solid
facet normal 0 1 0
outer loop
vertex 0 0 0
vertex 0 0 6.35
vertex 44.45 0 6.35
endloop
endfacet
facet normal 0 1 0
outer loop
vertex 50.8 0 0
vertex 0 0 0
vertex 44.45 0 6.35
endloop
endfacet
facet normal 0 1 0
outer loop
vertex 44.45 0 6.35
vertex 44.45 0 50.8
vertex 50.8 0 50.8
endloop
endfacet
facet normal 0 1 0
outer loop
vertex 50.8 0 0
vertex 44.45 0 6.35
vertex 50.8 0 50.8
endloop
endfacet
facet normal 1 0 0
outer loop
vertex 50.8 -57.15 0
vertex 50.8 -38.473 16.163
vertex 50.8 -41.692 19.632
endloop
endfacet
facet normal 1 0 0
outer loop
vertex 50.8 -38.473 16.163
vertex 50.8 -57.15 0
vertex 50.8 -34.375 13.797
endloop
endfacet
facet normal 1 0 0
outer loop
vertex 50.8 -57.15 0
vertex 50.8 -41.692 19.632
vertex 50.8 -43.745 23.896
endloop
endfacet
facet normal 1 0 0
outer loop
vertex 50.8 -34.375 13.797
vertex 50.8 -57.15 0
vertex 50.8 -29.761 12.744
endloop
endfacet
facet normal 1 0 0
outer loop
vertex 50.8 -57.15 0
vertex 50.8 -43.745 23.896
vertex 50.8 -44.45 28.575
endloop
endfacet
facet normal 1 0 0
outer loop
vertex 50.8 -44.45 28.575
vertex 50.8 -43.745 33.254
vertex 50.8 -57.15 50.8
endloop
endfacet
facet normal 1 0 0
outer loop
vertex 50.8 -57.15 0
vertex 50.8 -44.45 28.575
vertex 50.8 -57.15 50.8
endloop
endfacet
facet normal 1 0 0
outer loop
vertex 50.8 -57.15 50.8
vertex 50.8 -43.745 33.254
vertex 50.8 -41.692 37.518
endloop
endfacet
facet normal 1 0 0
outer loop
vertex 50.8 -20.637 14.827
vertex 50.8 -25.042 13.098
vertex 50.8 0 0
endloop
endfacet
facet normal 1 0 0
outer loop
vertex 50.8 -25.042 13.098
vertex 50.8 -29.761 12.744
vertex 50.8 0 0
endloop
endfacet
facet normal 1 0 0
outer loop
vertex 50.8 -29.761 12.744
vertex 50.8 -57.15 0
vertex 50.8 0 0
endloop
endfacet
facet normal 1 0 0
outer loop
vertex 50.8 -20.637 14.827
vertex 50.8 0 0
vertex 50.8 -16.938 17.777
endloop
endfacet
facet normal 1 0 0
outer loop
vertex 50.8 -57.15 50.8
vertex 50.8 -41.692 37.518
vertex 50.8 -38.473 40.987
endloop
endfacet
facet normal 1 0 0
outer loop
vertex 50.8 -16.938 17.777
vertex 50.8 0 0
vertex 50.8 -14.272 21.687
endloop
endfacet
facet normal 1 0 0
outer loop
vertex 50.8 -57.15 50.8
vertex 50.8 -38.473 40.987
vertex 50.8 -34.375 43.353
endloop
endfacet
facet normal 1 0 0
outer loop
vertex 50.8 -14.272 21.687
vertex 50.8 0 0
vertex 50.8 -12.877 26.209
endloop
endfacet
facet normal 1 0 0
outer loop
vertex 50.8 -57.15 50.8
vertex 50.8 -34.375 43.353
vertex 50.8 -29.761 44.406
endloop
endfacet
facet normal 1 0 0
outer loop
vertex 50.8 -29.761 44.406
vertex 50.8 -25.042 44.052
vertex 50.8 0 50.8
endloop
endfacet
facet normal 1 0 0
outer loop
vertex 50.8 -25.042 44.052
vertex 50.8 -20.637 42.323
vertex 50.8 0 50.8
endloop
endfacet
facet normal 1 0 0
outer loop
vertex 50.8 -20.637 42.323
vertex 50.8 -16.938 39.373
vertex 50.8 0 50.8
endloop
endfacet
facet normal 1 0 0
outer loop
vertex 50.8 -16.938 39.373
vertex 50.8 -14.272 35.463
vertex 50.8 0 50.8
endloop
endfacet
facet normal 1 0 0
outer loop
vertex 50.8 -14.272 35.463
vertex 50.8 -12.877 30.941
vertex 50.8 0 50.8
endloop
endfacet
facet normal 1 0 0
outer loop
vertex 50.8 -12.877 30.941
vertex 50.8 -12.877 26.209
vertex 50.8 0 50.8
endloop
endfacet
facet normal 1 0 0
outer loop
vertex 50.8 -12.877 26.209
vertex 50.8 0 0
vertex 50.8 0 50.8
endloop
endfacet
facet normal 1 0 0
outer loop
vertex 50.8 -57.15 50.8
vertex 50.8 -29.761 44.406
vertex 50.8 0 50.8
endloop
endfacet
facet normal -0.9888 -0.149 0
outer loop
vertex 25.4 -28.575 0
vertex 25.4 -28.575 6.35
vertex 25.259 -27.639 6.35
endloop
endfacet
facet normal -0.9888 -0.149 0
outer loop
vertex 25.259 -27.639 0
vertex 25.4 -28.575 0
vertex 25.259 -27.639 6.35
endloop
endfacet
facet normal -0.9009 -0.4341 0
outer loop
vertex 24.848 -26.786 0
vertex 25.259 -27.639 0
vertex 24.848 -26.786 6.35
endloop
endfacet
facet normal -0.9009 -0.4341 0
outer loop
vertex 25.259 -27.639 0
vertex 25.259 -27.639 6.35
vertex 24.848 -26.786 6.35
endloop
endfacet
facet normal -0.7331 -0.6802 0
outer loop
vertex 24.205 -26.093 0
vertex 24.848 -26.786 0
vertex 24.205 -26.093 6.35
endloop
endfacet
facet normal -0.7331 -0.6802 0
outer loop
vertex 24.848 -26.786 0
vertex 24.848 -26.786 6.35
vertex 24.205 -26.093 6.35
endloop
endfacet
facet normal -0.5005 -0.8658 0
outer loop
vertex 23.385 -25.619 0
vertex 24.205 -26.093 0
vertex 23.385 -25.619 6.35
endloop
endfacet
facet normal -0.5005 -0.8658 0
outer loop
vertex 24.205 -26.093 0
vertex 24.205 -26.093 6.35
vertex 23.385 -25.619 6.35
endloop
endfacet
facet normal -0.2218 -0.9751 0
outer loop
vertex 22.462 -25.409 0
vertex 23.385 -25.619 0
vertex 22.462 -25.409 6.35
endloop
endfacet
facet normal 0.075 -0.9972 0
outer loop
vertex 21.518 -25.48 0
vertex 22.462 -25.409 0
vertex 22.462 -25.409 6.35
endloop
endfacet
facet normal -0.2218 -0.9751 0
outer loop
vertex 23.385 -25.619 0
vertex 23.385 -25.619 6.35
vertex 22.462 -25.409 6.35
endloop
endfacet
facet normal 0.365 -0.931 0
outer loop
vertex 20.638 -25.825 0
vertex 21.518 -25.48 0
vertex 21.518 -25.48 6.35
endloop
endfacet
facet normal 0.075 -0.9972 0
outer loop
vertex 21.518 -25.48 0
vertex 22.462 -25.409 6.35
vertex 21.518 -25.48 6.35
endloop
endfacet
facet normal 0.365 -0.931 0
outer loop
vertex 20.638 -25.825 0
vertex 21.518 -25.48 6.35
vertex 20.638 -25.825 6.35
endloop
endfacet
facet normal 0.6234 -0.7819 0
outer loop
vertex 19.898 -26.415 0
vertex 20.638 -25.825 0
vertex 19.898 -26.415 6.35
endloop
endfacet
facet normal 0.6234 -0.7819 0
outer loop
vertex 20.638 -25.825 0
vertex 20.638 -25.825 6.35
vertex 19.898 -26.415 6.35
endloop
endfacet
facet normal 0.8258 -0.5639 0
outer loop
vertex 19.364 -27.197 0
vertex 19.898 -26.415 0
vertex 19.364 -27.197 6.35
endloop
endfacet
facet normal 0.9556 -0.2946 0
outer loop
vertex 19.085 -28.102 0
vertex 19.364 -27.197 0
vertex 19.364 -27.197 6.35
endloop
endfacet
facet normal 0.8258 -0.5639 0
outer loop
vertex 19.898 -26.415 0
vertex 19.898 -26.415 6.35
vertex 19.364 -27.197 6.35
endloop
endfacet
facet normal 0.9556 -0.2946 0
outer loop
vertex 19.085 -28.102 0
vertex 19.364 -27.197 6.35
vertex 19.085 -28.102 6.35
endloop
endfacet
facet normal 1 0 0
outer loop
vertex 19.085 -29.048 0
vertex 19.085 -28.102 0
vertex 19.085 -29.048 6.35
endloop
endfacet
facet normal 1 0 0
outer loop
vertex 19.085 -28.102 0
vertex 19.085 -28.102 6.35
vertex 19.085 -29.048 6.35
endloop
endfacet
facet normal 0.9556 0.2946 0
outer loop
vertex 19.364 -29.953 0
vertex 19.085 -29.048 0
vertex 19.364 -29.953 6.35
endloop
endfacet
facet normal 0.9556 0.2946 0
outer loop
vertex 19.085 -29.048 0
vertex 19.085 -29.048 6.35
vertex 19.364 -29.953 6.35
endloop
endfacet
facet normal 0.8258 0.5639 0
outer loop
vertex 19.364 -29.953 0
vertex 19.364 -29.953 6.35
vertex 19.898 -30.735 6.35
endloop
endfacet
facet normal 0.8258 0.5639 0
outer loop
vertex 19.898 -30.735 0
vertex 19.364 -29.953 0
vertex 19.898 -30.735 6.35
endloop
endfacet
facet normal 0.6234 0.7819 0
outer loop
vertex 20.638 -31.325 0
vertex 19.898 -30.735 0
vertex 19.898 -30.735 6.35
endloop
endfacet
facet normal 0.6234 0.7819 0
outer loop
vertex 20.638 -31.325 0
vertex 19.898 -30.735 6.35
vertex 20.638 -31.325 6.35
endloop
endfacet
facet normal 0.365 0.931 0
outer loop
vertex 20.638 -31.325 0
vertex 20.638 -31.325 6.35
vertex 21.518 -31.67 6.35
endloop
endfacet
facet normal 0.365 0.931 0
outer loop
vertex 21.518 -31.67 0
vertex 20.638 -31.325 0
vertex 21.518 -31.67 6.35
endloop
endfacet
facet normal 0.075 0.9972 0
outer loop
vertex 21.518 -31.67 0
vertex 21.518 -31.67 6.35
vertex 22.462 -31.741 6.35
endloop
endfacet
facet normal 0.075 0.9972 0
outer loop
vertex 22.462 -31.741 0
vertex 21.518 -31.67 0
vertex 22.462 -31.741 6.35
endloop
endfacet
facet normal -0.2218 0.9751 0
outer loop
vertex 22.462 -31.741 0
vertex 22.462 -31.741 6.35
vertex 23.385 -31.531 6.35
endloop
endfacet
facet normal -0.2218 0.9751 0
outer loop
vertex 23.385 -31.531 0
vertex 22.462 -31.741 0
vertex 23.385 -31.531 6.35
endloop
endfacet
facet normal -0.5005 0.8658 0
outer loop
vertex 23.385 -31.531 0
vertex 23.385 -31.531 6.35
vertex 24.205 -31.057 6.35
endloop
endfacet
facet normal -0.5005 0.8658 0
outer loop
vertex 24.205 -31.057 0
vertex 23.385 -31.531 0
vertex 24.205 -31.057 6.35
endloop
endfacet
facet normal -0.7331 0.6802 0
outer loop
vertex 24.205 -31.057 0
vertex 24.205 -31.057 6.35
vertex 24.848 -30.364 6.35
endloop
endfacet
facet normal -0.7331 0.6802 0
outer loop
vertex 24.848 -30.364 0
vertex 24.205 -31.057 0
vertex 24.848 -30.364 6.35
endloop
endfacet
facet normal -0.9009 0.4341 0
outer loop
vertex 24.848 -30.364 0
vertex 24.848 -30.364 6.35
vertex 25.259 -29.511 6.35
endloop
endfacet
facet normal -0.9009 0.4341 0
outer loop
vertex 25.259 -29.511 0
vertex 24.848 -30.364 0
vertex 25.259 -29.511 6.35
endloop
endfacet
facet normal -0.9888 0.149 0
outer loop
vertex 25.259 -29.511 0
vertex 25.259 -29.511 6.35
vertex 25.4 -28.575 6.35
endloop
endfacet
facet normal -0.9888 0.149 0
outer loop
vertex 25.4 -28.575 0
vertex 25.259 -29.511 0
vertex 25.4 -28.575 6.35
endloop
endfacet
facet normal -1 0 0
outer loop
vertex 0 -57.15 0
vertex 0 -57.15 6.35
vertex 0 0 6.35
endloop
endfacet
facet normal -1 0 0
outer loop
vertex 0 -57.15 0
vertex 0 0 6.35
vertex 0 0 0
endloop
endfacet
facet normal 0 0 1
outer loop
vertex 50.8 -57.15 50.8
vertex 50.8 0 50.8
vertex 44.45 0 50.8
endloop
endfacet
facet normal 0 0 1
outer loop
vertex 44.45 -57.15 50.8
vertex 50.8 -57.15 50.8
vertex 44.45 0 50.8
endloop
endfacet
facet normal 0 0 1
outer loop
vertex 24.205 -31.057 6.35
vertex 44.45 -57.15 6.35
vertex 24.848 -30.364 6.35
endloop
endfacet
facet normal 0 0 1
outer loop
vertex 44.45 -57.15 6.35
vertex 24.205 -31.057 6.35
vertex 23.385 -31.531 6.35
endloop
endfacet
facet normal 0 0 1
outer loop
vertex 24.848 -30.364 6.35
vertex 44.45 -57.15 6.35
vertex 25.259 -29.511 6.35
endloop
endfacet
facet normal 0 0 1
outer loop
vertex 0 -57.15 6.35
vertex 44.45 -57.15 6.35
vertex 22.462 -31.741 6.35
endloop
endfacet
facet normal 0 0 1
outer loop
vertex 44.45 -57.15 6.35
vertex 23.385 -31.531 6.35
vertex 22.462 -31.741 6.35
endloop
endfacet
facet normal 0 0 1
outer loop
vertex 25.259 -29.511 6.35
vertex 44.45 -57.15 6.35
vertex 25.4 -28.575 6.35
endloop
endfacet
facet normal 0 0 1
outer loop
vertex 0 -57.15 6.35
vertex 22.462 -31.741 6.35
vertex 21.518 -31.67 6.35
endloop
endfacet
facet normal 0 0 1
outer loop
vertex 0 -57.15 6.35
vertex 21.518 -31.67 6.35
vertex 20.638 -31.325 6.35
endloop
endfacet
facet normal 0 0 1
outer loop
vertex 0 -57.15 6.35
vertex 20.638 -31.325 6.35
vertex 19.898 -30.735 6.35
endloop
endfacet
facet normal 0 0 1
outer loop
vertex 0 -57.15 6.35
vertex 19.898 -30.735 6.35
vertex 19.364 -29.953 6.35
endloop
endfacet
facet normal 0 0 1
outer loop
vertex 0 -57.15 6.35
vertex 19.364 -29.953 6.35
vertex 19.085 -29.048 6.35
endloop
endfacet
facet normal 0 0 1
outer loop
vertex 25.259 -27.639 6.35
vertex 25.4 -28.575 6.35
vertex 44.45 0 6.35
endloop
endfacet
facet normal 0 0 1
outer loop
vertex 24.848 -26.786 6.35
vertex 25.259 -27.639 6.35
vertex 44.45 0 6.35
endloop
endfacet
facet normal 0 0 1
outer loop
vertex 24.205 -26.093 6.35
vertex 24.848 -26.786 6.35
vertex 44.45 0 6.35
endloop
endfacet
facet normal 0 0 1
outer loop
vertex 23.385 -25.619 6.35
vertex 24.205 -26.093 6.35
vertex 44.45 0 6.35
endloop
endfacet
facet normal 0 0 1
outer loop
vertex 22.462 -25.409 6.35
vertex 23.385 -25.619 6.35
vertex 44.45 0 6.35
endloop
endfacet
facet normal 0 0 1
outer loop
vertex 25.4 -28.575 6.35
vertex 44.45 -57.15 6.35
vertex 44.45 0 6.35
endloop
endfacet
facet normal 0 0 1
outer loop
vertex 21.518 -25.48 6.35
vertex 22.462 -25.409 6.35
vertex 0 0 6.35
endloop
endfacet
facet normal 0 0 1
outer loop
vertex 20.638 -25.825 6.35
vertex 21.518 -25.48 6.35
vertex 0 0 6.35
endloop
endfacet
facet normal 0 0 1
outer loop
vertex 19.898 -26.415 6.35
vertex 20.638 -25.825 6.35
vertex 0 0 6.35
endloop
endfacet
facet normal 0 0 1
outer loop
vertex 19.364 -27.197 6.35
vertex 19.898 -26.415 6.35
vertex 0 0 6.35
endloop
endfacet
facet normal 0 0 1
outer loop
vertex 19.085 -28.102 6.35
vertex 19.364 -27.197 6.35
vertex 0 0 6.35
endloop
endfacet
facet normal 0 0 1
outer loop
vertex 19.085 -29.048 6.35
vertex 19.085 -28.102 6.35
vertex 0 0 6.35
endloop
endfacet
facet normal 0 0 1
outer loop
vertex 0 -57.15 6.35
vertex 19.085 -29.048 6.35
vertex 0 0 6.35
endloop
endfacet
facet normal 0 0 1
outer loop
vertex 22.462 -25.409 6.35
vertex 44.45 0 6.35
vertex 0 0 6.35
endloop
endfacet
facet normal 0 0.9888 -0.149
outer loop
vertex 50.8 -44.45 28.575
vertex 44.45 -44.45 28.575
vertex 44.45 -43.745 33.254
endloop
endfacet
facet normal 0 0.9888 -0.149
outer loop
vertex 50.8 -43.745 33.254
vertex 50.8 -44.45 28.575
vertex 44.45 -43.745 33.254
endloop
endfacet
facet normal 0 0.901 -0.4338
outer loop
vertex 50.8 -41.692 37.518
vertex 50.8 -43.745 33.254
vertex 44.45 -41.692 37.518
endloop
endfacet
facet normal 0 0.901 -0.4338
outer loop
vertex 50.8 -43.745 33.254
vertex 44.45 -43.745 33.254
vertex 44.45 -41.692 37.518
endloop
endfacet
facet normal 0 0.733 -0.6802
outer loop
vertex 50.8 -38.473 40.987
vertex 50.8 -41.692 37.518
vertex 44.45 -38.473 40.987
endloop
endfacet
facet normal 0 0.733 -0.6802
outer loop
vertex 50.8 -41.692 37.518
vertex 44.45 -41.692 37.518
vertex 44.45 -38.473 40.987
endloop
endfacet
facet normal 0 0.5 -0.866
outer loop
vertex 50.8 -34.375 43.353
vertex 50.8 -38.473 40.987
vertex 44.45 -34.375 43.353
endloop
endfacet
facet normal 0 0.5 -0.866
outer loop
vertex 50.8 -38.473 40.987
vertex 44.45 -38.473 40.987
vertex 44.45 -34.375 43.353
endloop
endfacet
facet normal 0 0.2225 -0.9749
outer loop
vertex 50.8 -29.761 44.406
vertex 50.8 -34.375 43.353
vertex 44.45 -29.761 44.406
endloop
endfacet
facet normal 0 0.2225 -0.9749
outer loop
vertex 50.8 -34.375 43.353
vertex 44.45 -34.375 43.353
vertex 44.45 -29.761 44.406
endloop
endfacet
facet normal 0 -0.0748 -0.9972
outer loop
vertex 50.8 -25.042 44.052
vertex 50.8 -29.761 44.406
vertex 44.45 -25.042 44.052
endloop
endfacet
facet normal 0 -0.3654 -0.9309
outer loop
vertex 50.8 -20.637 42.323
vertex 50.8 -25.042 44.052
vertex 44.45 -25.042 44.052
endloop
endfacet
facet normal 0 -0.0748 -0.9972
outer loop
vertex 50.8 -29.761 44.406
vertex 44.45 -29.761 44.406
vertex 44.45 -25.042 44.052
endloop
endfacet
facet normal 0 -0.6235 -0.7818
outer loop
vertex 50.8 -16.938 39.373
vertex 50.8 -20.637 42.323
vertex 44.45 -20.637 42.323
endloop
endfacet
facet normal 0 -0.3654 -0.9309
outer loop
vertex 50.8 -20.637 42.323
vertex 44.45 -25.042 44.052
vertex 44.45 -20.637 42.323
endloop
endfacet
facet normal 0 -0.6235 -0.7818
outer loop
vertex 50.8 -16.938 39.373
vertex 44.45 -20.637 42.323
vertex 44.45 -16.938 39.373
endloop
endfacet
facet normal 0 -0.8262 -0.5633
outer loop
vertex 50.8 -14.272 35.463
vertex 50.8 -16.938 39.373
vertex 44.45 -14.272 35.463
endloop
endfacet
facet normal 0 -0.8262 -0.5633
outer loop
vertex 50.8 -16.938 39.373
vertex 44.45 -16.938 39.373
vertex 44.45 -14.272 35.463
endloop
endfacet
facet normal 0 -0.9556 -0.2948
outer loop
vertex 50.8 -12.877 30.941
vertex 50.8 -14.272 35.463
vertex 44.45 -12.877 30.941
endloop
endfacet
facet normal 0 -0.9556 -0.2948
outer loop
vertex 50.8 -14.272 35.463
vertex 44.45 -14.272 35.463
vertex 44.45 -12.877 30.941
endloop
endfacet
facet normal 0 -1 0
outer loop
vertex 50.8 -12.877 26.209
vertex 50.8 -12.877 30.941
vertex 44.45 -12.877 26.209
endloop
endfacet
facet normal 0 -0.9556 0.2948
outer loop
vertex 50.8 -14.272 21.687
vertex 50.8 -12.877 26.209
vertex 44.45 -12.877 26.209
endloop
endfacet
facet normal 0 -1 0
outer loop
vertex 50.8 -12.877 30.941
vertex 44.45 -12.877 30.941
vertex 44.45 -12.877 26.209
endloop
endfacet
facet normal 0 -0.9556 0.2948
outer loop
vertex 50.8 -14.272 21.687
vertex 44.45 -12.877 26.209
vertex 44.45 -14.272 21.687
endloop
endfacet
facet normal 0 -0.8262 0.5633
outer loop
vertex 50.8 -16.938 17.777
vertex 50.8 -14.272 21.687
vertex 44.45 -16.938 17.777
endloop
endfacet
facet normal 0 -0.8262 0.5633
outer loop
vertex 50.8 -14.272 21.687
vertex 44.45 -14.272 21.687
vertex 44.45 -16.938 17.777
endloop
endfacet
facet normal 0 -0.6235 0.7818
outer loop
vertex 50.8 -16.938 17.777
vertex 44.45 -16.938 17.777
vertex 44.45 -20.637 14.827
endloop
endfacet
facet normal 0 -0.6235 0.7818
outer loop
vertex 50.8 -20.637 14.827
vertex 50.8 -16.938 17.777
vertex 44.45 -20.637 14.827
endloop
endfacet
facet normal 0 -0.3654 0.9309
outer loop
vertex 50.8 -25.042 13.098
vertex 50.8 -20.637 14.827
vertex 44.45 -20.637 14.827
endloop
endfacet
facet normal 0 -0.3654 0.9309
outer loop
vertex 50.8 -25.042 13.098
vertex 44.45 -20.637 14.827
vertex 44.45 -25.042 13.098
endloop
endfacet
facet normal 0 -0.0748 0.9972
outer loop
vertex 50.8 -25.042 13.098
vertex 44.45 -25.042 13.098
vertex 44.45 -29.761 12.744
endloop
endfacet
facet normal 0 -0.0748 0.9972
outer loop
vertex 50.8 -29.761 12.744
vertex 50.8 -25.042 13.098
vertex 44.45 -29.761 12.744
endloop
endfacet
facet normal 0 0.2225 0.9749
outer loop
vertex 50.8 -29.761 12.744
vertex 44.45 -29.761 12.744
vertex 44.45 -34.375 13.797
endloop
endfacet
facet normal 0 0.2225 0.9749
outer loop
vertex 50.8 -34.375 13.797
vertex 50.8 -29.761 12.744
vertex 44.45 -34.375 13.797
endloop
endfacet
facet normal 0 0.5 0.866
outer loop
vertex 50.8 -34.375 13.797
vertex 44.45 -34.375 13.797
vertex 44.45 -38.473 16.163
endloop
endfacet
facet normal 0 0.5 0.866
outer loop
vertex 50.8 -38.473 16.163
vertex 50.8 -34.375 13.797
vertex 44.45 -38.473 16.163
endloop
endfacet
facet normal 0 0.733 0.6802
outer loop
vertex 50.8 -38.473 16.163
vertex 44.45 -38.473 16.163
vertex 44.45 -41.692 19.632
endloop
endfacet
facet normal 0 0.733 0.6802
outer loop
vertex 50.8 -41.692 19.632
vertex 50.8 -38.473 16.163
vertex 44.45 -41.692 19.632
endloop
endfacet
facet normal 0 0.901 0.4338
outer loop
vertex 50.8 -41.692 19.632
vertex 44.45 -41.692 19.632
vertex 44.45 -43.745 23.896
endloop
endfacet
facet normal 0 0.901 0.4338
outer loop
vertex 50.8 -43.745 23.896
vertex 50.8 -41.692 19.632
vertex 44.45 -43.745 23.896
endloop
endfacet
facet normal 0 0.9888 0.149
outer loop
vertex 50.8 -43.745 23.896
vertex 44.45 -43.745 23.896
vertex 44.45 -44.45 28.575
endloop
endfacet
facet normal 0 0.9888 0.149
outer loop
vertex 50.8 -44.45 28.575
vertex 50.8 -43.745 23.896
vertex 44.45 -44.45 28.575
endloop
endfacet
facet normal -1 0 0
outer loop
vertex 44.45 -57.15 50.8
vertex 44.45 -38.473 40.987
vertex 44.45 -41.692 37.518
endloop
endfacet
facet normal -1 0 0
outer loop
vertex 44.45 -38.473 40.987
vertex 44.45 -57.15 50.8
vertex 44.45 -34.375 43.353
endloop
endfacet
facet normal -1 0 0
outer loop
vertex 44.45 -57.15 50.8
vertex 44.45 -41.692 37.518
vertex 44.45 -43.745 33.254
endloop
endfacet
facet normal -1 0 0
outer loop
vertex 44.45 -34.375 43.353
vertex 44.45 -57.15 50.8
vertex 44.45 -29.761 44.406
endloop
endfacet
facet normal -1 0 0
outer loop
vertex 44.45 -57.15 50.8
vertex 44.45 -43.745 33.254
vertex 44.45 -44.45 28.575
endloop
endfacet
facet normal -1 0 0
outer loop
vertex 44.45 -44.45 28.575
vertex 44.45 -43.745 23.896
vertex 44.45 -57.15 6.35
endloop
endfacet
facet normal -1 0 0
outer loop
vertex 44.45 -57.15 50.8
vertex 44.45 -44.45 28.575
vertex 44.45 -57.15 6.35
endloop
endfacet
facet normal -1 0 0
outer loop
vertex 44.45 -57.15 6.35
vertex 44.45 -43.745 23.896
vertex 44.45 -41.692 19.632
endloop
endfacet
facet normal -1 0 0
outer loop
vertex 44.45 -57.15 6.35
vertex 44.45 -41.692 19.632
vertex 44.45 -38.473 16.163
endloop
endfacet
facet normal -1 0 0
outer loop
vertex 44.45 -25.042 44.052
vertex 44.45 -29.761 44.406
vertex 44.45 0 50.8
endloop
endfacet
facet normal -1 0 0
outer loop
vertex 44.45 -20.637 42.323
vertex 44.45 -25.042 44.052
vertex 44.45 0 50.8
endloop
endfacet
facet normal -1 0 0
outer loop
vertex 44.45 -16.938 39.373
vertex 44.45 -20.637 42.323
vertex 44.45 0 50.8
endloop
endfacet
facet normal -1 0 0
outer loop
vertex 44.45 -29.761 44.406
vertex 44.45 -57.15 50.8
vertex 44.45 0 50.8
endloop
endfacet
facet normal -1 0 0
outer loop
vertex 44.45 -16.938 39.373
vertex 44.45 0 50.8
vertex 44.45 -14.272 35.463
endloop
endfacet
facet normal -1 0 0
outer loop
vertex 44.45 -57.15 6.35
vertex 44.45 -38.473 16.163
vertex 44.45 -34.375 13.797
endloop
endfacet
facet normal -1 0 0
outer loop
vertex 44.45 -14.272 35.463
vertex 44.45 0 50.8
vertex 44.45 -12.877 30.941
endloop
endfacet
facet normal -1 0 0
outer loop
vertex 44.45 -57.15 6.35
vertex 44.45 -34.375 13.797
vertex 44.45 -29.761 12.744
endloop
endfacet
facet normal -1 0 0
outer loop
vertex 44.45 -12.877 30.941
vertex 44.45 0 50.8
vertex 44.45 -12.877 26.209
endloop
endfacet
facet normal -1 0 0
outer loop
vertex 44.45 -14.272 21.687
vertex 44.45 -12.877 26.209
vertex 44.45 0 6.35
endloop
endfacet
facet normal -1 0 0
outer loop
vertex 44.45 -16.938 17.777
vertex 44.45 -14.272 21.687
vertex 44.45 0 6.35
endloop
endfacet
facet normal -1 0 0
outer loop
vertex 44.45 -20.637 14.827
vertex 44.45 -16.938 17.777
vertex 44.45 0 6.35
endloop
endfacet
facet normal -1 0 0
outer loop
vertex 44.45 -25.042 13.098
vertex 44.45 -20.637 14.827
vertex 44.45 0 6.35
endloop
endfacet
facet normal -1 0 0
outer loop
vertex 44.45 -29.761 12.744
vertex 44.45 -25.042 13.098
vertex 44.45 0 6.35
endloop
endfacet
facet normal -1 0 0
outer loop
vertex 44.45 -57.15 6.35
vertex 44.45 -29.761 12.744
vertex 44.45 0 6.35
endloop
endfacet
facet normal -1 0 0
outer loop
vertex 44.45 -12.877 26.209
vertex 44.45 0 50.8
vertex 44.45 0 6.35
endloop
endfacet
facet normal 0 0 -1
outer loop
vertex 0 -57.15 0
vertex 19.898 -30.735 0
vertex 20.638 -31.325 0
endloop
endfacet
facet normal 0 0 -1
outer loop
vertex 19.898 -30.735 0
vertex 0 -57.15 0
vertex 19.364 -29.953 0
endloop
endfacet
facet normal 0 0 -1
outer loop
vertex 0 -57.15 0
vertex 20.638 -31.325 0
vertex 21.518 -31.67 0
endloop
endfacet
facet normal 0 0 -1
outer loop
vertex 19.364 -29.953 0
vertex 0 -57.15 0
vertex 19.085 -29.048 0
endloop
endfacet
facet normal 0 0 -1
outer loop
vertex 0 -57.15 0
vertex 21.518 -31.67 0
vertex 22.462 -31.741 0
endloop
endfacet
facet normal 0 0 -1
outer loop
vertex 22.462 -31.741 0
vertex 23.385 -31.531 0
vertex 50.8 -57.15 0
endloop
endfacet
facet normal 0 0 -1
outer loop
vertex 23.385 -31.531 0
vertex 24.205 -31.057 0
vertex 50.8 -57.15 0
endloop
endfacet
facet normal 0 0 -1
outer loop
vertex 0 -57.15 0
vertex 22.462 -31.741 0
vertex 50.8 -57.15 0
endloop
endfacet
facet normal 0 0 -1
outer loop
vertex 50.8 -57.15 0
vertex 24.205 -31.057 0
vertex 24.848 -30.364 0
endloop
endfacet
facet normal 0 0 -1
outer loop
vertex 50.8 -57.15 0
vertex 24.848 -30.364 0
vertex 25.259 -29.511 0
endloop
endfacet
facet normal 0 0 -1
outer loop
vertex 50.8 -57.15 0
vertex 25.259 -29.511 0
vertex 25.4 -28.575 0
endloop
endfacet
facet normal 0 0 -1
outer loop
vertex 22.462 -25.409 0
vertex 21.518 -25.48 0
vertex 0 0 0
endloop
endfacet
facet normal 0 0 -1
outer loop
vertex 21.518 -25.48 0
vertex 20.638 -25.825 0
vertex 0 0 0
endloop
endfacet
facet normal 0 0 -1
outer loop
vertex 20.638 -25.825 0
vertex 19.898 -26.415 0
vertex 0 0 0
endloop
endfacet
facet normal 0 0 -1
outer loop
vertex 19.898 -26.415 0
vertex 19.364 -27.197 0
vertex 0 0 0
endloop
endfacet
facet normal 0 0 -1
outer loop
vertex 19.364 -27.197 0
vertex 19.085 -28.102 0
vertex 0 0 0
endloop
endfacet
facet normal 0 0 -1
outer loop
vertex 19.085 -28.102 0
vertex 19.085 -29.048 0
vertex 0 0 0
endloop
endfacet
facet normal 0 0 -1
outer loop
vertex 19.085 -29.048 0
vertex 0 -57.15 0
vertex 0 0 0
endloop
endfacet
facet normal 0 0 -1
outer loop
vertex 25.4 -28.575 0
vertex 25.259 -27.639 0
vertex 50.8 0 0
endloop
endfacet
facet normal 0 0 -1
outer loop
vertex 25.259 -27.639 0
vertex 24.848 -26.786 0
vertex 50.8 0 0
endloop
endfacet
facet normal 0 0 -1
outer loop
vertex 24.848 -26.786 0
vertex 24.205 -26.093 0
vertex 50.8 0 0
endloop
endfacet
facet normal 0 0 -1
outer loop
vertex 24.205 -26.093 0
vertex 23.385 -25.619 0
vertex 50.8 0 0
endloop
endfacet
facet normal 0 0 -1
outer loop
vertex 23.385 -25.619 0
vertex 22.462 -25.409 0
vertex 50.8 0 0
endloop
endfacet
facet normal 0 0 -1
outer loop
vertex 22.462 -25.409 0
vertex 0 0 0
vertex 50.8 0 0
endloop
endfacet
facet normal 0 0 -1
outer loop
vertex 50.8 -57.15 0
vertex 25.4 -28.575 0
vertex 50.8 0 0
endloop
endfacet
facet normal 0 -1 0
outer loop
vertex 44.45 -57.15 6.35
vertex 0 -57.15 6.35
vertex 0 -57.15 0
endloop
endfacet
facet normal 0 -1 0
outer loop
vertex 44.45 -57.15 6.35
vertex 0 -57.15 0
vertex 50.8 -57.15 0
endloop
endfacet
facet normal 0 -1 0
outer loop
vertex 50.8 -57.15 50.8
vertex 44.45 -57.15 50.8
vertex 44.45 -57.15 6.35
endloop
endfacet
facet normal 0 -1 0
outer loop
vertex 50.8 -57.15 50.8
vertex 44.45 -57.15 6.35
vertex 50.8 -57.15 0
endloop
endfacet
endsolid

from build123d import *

# Parameters (mm, degrees)
F1_DEPTH = 57.15
F2_R     = 15.875
F3_DEPTH = 6.351
F4_R     = 3.175
F5_DEPTH = 6.351


with BuildPart() as f1:
    # F0 (on Front) → F1 (new body)
    with BuildSketch(Plane.XZ):
        Polygon((0, 6.35), (0, 0), (50.8, 0), (50.8, 50.8), (44.45, 50.8), (44.45, 6.35), align=None)
    extrude(amount=F1_DEPTH)

    # F2 (on face) → F3 (cut, through all)
    with BuildSketch(Plane(origin=(44.45, 0, 0), x_dir=(0, -1, 0), z_dir=(-1, 0, 0))):
        with Locations((28.575, 28.575)):
            Circle(F2_R)
    extrude(amount=-F3_DEPTH, mode=Mode.SUBTRACT)

    # F4 (on face) → F5 (cut, through all)
    with BuildSketch(Plane.XY.offset(6.35)):
        with Locations((22.225, -28.575)):
            Circle(F4_R)
    extrude(amount=-F5_DEPTH, mode=Mode.SUBTRACT)


solid = f1.part
